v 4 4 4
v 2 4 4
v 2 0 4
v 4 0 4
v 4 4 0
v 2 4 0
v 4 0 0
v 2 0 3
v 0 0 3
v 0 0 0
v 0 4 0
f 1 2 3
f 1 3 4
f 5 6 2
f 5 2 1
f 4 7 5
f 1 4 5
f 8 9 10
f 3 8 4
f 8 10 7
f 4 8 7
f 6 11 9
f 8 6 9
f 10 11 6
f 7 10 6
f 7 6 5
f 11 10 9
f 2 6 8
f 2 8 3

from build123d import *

# Parameters (mm, degrees)
SKETCH7_W           = 4
SKETCH7_H           = 4
BOSS_EXTRUDE6_DEPTH = 4
CUT_EXTRUDE2_DEPTH  = 2


with BuildPart() as part:
    # Sketch7 → Boss-Extrude6 (new body)
    with BuildSketch(Plane.XY):
        with Locations((2, 2)):
            Rectangle(SKETCH7_W, SKETCH7_H)
    extrude(amount=BOSS_EXTRUDE6_DEPTH)

    # Sketch8 → Cut-Extrude2 (cut)
    with BuildSketch(Plane.ZY):
        Polygon((0, 4), (3, 0), (4, 0), (4, 4), align=None)
    extrude(amount=-CUT_EXTRUDE2_DEPTH, mode=Mode.SUBTRACT)


solid = part.part
